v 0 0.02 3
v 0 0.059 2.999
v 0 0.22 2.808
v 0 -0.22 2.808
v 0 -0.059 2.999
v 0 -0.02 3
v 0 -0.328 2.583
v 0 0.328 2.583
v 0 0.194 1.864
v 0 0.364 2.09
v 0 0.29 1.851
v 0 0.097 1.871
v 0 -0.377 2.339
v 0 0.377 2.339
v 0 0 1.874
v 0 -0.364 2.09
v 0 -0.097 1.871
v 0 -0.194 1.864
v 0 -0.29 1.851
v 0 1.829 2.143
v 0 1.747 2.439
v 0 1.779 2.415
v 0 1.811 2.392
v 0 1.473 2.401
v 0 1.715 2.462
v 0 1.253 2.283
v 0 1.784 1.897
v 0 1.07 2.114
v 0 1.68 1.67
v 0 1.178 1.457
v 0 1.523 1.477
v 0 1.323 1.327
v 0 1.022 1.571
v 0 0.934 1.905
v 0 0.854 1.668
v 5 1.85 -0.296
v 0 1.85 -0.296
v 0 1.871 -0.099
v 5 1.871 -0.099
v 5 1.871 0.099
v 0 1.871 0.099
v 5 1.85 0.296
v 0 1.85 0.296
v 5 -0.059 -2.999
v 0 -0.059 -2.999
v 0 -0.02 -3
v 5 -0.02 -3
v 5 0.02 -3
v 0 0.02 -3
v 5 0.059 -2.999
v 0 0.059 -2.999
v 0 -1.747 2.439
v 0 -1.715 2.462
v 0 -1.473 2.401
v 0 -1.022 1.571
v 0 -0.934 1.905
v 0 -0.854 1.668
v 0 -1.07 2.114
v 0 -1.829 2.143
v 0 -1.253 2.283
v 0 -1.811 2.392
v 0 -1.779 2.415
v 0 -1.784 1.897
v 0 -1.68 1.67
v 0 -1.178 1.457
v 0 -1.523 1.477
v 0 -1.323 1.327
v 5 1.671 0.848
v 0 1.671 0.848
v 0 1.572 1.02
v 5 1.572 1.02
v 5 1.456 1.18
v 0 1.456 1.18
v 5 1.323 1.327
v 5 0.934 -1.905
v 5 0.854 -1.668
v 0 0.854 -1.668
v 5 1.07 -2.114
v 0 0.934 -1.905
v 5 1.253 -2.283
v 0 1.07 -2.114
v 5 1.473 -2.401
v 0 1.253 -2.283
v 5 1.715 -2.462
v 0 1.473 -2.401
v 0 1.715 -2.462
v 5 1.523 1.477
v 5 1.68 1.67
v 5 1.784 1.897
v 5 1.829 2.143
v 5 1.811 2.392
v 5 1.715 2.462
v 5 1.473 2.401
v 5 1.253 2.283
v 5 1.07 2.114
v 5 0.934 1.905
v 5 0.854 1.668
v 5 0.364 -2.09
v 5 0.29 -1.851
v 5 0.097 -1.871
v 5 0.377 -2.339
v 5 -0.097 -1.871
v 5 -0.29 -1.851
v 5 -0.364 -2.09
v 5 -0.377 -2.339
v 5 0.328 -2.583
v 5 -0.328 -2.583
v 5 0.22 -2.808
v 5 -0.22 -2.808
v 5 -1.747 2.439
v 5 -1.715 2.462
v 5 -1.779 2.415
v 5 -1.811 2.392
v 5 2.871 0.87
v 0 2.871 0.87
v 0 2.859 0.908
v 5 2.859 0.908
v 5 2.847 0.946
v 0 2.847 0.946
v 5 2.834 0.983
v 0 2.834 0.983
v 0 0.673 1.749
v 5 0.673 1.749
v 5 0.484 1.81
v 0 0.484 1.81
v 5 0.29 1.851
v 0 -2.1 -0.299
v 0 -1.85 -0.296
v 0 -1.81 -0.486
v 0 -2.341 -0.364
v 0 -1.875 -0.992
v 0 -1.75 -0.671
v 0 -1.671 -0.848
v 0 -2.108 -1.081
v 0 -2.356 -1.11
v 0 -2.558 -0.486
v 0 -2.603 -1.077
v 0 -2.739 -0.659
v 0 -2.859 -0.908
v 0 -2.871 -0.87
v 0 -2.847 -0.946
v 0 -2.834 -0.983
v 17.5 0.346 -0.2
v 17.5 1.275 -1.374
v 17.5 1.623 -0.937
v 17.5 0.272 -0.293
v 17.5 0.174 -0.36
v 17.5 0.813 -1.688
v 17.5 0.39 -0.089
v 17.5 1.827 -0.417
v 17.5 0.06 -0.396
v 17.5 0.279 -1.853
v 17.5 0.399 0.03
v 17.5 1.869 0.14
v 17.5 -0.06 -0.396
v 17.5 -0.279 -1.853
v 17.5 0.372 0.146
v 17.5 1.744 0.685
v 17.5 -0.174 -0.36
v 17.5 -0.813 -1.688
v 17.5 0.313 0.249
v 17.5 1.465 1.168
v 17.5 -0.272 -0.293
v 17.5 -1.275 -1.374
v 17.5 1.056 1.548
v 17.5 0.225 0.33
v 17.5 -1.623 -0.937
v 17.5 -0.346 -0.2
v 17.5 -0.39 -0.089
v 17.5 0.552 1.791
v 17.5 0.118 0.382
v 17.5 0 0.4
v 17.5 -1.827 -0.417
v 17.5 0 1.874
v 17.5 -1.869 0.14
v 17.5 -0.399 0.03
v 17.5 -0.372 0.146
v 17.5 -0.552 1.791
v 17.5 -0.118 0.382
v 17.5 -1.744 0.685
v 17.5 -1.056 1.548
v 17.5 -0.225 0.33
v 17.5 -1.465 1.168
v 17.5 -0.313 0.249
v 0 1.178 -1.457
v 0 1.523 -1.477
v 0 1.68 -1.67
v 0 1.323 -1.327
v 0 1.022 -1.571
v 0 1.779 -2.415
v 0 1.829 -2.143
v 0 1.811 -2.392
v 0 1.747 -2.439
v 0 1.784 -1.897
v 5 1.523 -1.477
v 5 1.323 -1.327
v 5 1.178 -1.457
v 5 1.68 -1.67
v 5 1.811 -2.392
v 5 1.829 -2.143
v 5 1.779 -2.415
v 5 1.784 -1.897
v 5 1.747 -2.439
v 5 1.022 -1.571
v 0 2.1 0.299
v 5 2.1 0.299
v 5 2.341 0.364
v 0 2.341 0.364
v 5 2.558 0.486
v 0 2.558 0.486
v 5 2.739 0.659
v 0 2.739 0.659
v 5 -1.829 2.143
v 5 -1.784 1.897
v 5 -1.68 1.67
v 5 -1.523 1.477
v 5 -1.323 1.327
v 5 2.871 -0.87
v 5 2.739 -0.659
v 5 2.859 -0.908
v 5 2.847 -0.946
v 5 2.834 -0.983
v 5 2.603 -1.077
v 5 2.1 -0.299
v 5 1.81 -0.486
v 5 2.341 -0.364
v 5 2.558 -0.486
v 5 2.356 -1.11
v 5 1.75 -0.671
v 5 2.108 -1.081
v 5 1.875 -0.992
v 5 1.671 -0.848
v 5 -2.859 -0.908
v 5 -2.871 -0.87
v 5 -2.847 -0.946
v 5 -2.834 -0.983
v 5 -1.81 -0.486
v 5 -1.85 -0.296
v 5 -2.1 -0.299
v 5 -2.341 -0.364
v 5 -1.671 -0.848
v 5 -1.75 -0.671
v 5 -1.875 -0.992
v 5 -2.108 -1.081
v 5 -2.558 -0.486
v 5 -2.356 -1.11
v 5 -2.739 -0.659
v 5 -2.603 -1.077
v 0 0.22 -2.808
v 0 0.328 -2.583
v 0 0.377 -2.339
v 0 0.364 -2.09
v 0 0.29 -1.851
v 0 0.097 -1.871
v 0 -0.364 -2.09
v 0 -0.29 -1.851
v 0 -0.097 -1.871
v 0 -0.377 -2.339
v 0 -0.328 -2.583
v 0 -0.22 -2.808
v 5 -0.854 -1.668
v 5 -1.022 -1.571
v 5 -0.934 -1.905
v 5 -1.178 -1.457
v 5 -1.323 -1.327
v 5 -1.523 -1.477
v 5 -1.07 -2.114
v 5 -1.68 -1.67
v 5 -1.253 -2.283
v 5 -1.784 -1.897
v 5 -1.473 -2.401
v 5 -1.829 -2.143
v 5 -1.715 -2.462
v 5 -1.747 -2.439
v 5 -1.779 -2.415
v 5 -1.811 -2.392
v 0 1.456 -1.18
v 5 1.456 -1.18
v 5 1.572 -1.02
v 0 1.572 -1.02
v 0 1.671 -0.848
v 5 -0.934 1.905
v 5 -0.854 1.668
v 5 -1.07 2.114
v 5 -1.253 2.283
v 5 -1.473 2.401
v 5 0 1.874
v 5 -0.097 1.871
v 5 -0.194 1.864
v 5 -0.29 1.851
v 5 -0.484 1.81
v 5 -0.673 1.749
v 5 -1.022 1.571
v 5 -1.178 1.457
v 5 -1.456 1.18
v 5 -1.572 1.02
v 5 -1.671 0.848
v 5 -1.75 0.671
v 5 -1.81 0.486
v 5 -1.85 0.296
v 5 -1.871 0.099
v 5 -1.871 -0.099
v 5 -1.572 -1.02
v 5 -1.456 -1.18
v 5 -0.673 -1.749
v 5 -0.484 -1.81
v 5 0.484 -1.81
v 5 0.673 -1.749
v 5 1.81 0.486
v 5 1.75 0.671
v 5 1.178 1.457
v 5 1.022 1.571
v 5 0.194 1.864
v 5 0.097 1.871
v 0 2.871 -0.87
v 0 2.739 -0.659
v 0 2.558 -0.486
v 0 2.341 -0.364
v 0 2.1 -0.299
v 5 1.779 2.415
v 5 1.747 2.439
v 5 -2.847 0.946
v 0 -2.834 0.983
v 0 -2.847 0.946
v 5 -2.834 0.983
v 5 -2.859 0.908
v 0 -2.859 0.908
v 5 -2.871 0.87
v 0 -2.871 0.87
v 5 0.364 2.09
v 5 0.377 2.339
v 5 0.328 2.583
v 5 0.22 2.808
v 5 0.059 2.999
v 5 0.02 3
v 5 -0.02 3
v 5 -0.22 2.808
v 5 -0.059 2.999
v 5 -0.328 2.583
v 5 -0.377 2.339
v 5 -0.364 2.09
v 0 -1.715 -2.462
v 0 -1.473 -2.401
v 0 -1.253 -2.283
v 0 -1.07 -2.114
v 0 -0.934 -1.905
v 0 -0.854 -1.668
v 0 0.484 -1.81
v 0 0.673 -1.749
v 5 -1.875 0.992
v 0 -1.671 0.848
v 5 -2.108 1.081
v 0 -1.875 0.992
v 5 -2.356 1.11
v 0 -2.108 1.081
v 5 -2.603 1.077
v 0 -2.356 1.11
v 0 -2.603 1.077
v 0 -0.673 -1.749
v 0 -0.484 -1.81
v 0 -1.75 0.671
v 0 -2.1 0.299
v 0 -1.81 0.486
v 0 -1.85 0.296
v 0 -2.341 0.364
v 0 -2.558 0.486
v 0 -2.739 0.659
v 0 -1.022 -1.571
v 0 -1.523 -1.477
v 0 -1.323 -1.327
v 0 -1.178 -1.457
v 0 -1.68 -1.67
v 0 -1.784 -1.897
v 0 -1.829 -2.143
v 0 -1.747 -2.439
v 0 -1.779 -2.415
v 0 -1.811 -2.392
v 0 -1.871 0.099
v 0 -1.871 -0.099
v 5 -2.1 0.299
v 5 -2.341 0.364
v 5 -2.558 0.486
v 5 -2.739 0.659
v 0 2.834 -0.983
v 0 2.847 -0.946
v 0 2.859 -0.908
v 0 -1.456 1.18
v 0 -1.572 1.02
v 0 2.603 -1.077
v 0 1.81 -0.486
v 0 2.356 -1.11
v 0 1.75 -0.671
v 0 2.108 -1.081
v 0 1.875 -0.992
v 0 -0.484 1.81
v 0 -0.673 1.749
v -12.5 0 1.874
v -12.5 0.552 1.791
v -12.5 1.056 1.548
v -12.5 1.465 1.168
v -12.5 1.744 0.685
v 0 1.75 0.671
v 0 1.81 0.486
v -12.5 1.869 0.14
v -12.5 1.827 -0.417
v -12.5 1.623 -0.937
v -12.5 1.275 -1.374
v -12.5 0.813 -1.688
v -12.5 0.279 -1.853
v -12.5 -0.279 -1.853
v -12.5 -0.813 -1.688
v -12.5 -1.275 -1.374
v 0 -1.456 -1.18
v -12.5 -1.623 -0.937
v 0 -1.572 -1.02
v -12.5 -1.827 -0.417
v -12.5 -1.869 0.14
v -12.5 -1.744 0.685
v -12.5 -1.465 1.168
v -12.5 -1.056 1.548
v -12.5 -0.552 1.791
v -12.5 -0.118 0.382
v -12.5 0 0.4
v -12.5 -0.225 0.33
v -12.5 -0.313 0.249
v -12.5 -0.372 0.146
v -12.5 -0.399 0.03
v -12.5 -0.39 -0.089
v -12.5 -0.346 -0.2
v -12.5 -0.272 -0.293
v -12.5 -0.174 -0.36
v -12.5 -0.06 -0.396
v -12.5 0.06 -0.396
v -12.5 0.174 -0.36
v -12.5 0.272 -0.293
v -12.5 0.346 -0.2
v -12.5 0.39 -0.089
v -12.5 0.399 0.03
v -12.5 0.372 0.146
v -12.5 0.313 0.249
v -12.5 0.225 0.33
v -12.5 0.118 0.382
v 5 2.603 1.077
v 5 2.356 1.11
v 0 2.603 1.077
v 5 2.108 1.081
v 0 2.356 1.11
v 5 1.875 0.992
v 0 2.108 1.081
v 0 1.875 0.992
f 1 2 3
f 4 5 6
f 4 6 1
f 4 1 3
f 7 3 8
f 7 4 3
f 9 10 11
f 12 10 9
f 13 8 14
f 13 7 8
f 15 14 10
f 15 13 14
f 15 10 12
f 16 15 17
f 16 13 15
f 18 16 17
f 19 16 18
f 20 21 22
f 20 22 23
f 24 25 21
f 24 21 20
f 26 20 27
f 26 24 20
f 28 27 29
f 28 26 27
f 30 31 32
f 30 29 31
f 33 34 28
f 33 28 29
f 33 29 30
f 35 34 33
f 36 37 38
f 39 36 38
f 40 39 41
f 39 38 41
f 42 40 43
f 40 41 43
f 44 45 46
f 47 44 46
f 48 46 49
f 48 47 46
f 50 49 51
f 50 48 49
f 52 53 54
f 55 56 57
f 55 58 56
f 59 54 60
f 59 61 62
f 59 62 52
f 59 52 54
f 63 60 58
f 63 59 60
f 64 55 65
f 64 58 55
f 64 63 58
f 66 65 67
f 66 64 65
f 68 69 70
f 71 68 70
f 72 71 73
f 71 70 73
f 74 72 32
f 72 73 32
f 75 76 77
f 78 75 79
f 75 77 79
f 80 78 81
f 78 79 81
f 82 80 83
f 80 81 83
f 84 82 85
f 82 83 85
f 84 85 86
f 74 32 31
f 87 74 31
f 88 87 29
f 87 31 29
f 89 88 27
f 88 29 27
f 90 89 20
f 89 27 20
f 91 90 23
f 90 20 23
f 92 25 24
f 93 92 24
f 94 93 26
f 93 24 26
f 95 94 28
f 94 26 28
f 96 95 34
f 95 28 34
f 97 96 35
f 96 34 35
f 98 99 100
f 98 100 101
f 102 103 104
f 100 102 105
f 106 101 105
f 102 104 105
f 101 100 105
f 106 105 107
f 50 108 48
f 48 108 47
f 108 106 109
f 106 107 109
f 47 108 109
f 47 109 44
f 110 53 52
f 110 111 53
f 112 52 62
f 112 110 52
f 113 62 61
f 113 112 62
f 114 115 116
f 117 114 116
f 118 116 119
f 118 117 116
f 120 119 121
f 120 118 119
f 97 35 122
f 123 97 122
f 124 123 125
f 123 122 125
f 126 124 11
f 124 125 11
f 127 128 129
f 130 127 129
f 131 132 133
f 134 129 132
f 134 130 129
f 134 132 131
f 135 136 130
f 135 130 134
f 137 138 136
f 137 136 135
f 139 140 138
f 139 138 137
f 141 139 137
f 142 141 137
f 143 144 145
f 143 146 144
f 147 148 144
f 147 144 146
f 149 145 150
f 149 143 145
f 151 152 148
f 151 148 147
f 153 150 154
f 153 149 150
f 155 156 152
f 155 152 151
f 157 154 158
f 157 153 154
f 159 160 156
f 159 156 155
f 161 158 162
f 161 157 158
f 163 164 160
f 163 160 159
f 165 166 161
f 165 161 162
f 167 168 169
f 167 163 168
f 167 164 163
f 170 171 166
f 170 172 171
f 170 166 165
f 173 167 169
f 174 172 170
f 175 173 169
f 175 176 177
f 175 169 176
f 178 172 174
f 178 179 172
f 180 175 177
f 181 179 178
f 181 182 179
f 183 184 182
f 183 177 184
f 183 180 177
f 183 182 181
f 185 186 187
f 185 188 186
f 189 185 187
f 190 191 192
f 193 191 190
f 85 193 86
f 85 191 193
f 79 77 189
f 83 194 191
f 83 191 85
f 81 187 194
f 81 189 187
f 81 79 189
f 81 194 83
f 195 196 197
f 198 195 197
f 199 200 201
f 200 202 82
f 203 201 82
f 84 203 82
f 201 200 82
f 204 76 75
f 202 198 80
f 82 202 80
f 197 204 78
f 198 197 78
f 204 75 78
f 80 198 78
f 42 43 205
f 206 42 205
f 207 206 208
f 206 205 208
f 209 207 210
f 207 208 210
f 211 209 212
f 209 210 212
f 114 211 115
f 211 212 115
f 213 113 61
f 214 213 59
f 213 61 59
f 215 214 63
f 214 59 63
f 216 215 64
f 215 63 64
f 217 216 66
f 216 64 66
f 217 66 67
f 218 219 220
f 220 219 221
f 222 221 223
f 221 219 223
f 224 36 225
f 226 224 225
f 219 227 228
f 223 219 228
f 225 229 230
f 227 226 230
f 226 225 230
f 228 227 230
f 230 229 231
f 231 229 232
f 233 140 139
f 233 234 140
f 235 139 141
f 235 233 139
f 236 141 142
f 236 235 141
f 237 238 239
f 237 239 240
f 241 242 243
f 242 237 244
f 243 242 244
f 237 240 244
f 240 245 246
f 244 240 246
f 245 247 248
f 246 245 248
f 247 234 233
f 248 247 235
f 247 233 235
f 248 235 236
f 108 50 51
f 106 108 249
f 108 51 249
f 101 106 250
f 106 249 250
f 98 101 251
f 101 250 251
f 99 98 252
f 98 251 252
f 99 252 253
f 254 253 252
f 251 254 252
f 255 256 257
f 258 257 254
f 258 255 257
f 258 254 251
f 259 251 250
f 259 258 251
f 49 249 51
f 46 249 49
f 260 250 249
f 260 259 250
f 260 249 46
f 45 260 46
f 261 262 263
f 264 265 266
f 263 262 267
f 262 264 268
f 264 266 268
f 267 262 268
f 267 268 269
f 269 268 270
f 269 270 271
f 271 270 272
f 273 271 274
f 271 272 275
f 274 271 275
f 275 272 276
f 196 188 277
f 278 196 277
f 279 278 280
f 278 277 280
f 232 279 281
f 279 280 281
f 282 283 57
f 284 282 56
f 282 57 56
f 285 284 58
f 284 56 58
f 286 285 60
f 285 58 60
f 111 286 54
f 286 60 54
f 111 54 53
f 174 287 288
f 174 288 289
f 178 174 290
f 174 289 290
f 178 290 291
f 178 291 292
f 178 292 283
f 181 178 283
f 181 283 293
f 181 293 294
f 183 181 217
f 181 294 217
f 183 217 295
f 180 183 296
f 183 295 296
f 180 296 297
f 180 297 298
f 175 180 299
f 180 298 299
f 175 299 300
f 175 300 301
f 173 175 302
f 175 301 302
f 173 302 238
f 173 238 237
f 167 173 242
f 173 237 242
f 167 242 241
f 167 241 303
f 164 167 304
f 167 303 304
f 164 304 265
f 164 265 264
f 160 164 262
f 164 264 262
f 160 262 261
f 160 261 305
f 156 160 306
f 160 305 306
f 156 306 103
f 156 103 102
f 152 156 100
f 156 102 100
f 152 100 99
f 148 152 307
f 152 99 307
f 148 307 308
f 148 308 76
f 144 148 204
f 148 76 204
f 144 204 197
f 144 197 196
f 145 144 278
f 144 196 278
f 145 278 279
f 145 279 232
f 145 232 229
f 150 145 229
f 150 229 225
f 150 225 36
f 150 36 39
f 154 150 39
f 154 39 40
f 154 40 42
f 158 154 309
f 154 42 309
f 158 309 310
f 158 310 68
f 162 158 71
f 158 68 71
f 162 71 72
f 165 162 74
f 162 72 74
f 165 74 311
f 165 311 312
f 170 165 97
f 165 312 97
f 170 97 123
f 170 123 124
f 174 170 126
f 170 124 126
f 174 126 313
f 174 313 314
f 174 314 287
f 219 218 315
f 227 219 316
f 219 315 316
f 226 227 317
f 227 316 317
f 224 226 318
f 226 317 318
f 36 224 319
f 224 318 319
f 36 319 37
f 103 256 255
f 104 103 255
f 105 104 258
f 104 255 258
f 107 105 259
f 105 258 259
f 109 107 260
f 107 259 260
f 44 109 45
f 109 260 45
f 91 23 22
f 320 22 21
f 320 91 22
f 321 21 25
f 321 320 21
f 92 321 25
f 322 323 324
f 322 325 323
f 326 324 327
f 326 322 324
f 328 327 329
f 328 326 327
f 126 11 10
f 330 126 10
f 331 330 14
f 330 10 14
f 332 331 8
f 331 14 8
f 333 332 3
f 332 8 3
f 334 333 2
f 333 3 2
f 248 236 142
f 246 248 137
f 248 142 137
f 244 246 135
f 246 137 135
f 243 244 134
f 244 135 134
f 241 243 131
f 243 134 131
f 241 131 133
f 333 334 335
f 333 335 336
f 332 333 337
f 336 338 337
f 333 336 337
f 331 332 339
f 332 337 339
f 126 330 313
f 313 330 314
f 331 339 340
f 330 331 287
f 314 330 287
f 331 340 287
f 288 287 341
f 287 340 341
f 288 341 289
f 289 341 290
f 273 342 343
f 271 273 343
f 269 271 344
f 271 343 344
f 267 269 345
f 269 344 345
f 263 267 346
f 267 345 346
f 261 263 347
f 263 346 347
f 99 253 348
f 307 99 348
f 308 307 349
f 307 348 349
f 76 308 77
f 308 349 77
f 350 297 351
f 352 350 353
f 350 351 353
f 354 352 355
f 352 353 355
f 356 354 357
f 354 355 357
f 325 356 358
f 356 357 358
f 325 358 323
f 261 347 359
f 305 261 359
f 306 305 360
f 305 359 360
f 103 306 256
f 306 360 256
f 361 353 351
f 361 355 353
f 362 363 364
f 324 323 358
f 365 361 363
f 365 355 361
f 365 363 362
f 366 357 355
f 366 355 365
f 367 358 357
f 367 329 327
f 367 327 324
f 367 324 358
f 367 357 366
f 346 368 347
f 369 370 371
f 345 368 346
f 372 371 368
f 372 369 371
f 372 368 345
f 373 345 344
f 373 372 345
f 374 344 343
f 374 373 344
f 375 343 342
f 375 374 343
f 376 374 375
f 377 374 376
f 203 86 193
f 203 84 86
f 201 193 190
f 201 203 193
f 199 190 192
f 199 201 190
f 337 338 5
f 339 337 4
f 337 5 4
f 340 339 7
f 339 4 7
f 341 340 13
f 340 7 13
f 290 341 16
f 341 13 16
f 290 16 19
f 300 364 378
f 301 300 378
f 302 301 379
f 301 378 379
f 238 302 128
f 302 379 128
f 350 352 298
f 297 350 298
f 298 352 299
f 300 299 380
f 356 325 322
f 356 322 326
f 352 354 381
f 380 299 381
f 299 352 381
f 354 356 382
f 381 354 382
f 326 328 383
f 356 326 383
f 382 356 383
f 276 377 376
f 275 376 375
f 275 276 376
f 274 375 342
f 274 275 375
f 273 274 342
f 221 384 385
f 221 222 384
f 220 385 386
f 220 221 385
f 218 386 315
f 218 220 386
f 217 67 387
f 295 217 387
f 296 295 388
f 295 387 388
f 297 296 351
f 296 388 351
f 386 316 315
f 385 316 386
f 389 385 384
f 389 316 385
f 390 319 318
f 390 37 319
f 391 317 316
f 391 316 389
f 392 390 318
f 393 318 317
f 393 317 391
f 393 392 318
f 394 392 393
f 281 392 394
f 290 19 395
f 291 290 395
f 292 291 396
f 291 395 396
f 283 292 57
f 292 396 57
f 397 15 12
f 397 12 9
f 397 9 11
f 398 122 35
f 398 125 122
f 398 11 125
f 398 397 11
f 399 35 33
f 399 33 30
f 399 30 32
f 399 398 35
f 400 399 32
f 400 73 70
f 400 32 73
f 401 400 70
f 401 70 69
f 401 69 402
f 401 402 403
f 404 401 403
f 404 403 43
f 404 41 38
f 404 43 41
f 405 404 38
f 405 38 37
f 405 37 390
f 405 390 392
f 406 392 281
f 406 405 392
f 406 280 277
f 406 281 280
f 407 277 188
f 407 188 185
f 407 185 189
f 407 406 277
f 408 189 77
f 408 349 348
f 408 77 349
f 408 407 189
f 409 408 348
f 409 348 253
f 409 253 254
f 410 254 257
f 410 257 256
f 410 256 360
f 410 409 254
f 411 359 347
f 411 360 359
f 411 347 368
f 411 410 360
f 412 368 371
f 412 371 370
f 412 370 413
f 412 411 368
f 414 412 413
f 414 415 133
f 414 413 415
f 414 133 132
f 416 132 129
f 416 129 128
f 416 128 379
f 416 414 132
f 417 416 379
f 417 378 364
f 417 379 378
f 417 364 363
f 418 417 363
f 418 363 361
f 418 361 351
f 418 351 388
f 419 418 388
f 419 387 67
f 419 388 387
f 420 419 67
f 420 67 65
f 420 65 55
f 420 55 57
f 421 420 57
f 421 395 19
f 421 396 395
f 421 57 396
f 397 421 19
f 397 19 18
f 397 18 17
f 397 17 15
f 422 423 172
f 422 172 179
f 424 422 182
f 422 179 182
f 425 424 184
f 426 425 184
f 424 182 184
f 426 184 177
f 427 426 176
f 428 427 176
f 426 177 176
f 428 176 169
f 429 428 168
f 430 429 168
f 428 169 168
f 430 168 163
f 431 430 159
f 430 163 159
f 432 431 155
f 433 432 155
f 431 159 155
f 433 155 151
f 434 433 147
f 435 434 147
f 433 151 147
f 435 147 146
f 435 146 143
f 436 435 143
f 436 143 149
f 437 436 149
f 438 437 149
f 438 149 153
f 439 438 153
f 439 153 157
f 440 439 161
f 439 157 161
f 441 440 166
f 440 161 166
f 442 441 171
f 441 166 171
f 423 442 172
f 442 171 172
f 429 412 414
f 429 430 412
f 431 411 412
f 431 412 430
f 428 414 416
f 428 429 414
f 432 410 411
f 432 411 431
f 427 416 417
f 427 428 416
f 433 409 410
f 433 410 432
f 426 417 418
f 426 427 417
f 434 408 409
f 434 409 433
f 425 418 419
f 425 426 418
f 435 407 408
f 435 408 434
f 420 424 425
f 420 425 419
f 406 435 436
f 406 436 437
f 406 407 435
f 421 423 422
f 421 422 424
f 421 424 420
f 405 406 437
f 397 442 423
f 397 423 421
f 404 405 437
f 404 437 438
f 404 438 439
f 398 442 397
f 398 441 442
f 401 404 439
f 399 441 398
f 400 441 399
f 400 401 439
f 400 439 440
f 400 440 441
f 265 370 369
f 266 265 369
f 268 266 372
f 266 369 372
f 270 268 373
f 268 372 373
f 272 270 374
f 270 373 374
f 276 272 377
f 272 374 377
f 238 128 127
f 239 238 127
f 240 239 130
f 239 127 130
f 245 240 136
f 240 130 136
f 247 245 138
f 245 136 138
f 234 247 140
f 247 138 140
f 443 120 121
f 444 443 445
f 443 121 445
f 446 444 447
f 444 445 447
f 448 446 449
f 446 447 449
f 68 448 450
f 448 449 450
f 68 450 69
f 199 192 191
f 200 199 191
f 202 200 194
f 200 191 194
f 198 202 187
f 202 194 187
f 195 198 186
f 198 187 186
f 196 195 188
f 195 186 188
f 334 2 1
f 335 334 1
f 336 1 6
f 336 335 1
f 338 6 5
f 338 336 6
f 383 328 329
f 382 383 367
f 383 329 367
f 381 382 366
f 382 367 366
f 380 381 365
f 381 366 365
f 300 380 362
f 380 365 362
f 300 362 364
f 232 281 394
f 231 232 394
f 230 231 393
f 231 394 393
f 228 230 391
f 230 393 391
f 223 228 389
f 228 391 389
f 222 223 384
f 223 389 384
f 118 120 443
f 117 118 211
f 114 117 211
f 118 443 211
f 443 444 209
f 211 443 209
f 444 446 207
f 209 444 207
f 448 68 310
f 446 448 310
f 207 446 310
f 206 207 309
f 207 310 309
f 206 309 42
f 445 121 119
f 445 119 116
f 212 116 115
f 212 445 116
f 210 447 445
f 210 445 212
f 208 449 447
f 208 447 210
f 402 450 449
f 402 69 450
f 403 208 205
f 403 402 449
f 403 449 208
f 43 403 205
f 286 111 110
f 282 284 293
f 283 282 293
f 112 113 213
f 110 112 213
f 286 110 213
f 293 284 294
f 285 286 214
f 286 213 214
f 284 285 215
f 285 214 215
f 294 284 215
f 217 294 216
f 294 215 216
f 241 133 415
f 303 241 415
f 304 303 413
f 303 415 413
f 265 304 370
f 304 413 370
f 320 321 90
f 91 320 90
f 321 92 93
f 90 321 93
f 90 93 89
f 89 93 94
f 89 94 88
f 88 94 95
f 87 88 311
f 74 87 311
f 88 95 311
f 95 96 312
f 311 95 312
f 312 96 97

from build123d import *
from build123d.topology import SkipClean

# Parameters (mm, degrees)
BASPROSKE_W       = 5
BASPROSKE_H       = 3
TOOTHCUT_DEPTH    = 7.557438524
TEETHCUTS_COUNT   = 10
TEETHCUTS_ANGLE   = 324
HUBNEARBOTH_START = 12.5000254
HUBNEABOTSKE_R    = 1.874
HUBNEARBOTH_DEPTH = 12.5000254
HUBFARSKE_R       = 1.874
HUBFAR_DEPTH      = 12.5000254
BORSKE_R          = 0.4
BORE_DEPTH        = 30.0000508


with BuildPart() as part:
    # BasProSke → Base-Revolve (revolve)
    with BuildSketch(Plane(origin=(0, 0, 0), x_dir=(1, 0, 0), z_dir=(0, 1, 0)), mode=Mode.PRIVATE) as base_revolve_sk:
        with Locations((2.5, 1.5)):
            Rectangle(BASPROSKE_W, BASPROSKE_H)
    revolve(base_revolve_sk.sketch.rotate(Axis((-10, 0, 0), (1, 0, 0)), 180), axis=Axis((-10, 0, 0), (1, 0, 0)))

    # TooCutSke → ToothCut (cut, through all)
    with BuildSketch(Plane(origin=(0, 0, 0), x_dir=(0, 0, -1), z_dir=(1, 0, 0))):
        with BuildLine():
            ThreePointArc((0.296449938, 1.850403587), (0, 1.874), (-0.296449938, 1.850403587))
            ThreePointArc((-0.296449938, 1.850403587), (-0.428089565, 2.470295585), (-0.905889751, 2.886591228))
            ThreePointArc((-0.905889751, 2.886591228), (0, 3.0254), (0.905889751, 2.886591228))
            ThreePointArc((0.905889751, 2.886591228), (0.428089565, 2.470295585), (0.296449938, 1.850403587))
        make_face()
    toothcut = extrude(amount=TOOTHCUT_DEPTH, mode=Mode.SUBTRACT)

    # TeethCuts: ToothCut ×10 about axis
    teethcuts_axis = Axis((-10, 0, 0), (1, 0, 0))
    for i in range(1, TEETHCUTS_COUNT):
        add(toothcut.rotate(teethcuts_axis, i * TEETHCUTS_ANGLE / (TEETHCUTS_COUNT - 1)), mode=Mode.SUBTRACT)

    # HubNeaBotSke → HubNearBoth (add)
    with SkipClean():  # the faces are left unmerged after this step: merging them gives an invalid solid
        with BuildSketch(Plane.ZY.offset(HUBNEARBOTH_START)):
            Circle(HUBNEABOTSKE_R)
        extrude(amount=-HUBNEARBOTH_DEPTH)

    # HubFarSke → HubFar (add)
    with SkipClean():  # the faces are left unmerged after this step: merging them gives an invalid solid
        with BuildSketch(Plane(origin=(5, 0, 0), x_dir=(0, 0, -1), z_dir=(1, 0, 0))):
            with Locations(Location((0, 0, 0), (0, 0, 180))):
                Circle(HUBFARSKE_R)
        extrude(amount=HUBFAR_DEPTH)

    # BorSke → Bore (cut, symmetric)
    with SkipClean():  # the faces are left unmerged after this step: merging them gives an invalid solid
        with BuildSketch(Plane(origin=(0, 0, 0), x_dir=(0, 0, -1), z_dir=(1, 0, 0))):
            with Locations(Location((0, 0, 0), (0, 0, 180))):
                Circle(BORSKE_R)
        extrude(amount=BORE_DEPTH, both=True, mode=Mode.SUBTRACT)


solid = part.part
